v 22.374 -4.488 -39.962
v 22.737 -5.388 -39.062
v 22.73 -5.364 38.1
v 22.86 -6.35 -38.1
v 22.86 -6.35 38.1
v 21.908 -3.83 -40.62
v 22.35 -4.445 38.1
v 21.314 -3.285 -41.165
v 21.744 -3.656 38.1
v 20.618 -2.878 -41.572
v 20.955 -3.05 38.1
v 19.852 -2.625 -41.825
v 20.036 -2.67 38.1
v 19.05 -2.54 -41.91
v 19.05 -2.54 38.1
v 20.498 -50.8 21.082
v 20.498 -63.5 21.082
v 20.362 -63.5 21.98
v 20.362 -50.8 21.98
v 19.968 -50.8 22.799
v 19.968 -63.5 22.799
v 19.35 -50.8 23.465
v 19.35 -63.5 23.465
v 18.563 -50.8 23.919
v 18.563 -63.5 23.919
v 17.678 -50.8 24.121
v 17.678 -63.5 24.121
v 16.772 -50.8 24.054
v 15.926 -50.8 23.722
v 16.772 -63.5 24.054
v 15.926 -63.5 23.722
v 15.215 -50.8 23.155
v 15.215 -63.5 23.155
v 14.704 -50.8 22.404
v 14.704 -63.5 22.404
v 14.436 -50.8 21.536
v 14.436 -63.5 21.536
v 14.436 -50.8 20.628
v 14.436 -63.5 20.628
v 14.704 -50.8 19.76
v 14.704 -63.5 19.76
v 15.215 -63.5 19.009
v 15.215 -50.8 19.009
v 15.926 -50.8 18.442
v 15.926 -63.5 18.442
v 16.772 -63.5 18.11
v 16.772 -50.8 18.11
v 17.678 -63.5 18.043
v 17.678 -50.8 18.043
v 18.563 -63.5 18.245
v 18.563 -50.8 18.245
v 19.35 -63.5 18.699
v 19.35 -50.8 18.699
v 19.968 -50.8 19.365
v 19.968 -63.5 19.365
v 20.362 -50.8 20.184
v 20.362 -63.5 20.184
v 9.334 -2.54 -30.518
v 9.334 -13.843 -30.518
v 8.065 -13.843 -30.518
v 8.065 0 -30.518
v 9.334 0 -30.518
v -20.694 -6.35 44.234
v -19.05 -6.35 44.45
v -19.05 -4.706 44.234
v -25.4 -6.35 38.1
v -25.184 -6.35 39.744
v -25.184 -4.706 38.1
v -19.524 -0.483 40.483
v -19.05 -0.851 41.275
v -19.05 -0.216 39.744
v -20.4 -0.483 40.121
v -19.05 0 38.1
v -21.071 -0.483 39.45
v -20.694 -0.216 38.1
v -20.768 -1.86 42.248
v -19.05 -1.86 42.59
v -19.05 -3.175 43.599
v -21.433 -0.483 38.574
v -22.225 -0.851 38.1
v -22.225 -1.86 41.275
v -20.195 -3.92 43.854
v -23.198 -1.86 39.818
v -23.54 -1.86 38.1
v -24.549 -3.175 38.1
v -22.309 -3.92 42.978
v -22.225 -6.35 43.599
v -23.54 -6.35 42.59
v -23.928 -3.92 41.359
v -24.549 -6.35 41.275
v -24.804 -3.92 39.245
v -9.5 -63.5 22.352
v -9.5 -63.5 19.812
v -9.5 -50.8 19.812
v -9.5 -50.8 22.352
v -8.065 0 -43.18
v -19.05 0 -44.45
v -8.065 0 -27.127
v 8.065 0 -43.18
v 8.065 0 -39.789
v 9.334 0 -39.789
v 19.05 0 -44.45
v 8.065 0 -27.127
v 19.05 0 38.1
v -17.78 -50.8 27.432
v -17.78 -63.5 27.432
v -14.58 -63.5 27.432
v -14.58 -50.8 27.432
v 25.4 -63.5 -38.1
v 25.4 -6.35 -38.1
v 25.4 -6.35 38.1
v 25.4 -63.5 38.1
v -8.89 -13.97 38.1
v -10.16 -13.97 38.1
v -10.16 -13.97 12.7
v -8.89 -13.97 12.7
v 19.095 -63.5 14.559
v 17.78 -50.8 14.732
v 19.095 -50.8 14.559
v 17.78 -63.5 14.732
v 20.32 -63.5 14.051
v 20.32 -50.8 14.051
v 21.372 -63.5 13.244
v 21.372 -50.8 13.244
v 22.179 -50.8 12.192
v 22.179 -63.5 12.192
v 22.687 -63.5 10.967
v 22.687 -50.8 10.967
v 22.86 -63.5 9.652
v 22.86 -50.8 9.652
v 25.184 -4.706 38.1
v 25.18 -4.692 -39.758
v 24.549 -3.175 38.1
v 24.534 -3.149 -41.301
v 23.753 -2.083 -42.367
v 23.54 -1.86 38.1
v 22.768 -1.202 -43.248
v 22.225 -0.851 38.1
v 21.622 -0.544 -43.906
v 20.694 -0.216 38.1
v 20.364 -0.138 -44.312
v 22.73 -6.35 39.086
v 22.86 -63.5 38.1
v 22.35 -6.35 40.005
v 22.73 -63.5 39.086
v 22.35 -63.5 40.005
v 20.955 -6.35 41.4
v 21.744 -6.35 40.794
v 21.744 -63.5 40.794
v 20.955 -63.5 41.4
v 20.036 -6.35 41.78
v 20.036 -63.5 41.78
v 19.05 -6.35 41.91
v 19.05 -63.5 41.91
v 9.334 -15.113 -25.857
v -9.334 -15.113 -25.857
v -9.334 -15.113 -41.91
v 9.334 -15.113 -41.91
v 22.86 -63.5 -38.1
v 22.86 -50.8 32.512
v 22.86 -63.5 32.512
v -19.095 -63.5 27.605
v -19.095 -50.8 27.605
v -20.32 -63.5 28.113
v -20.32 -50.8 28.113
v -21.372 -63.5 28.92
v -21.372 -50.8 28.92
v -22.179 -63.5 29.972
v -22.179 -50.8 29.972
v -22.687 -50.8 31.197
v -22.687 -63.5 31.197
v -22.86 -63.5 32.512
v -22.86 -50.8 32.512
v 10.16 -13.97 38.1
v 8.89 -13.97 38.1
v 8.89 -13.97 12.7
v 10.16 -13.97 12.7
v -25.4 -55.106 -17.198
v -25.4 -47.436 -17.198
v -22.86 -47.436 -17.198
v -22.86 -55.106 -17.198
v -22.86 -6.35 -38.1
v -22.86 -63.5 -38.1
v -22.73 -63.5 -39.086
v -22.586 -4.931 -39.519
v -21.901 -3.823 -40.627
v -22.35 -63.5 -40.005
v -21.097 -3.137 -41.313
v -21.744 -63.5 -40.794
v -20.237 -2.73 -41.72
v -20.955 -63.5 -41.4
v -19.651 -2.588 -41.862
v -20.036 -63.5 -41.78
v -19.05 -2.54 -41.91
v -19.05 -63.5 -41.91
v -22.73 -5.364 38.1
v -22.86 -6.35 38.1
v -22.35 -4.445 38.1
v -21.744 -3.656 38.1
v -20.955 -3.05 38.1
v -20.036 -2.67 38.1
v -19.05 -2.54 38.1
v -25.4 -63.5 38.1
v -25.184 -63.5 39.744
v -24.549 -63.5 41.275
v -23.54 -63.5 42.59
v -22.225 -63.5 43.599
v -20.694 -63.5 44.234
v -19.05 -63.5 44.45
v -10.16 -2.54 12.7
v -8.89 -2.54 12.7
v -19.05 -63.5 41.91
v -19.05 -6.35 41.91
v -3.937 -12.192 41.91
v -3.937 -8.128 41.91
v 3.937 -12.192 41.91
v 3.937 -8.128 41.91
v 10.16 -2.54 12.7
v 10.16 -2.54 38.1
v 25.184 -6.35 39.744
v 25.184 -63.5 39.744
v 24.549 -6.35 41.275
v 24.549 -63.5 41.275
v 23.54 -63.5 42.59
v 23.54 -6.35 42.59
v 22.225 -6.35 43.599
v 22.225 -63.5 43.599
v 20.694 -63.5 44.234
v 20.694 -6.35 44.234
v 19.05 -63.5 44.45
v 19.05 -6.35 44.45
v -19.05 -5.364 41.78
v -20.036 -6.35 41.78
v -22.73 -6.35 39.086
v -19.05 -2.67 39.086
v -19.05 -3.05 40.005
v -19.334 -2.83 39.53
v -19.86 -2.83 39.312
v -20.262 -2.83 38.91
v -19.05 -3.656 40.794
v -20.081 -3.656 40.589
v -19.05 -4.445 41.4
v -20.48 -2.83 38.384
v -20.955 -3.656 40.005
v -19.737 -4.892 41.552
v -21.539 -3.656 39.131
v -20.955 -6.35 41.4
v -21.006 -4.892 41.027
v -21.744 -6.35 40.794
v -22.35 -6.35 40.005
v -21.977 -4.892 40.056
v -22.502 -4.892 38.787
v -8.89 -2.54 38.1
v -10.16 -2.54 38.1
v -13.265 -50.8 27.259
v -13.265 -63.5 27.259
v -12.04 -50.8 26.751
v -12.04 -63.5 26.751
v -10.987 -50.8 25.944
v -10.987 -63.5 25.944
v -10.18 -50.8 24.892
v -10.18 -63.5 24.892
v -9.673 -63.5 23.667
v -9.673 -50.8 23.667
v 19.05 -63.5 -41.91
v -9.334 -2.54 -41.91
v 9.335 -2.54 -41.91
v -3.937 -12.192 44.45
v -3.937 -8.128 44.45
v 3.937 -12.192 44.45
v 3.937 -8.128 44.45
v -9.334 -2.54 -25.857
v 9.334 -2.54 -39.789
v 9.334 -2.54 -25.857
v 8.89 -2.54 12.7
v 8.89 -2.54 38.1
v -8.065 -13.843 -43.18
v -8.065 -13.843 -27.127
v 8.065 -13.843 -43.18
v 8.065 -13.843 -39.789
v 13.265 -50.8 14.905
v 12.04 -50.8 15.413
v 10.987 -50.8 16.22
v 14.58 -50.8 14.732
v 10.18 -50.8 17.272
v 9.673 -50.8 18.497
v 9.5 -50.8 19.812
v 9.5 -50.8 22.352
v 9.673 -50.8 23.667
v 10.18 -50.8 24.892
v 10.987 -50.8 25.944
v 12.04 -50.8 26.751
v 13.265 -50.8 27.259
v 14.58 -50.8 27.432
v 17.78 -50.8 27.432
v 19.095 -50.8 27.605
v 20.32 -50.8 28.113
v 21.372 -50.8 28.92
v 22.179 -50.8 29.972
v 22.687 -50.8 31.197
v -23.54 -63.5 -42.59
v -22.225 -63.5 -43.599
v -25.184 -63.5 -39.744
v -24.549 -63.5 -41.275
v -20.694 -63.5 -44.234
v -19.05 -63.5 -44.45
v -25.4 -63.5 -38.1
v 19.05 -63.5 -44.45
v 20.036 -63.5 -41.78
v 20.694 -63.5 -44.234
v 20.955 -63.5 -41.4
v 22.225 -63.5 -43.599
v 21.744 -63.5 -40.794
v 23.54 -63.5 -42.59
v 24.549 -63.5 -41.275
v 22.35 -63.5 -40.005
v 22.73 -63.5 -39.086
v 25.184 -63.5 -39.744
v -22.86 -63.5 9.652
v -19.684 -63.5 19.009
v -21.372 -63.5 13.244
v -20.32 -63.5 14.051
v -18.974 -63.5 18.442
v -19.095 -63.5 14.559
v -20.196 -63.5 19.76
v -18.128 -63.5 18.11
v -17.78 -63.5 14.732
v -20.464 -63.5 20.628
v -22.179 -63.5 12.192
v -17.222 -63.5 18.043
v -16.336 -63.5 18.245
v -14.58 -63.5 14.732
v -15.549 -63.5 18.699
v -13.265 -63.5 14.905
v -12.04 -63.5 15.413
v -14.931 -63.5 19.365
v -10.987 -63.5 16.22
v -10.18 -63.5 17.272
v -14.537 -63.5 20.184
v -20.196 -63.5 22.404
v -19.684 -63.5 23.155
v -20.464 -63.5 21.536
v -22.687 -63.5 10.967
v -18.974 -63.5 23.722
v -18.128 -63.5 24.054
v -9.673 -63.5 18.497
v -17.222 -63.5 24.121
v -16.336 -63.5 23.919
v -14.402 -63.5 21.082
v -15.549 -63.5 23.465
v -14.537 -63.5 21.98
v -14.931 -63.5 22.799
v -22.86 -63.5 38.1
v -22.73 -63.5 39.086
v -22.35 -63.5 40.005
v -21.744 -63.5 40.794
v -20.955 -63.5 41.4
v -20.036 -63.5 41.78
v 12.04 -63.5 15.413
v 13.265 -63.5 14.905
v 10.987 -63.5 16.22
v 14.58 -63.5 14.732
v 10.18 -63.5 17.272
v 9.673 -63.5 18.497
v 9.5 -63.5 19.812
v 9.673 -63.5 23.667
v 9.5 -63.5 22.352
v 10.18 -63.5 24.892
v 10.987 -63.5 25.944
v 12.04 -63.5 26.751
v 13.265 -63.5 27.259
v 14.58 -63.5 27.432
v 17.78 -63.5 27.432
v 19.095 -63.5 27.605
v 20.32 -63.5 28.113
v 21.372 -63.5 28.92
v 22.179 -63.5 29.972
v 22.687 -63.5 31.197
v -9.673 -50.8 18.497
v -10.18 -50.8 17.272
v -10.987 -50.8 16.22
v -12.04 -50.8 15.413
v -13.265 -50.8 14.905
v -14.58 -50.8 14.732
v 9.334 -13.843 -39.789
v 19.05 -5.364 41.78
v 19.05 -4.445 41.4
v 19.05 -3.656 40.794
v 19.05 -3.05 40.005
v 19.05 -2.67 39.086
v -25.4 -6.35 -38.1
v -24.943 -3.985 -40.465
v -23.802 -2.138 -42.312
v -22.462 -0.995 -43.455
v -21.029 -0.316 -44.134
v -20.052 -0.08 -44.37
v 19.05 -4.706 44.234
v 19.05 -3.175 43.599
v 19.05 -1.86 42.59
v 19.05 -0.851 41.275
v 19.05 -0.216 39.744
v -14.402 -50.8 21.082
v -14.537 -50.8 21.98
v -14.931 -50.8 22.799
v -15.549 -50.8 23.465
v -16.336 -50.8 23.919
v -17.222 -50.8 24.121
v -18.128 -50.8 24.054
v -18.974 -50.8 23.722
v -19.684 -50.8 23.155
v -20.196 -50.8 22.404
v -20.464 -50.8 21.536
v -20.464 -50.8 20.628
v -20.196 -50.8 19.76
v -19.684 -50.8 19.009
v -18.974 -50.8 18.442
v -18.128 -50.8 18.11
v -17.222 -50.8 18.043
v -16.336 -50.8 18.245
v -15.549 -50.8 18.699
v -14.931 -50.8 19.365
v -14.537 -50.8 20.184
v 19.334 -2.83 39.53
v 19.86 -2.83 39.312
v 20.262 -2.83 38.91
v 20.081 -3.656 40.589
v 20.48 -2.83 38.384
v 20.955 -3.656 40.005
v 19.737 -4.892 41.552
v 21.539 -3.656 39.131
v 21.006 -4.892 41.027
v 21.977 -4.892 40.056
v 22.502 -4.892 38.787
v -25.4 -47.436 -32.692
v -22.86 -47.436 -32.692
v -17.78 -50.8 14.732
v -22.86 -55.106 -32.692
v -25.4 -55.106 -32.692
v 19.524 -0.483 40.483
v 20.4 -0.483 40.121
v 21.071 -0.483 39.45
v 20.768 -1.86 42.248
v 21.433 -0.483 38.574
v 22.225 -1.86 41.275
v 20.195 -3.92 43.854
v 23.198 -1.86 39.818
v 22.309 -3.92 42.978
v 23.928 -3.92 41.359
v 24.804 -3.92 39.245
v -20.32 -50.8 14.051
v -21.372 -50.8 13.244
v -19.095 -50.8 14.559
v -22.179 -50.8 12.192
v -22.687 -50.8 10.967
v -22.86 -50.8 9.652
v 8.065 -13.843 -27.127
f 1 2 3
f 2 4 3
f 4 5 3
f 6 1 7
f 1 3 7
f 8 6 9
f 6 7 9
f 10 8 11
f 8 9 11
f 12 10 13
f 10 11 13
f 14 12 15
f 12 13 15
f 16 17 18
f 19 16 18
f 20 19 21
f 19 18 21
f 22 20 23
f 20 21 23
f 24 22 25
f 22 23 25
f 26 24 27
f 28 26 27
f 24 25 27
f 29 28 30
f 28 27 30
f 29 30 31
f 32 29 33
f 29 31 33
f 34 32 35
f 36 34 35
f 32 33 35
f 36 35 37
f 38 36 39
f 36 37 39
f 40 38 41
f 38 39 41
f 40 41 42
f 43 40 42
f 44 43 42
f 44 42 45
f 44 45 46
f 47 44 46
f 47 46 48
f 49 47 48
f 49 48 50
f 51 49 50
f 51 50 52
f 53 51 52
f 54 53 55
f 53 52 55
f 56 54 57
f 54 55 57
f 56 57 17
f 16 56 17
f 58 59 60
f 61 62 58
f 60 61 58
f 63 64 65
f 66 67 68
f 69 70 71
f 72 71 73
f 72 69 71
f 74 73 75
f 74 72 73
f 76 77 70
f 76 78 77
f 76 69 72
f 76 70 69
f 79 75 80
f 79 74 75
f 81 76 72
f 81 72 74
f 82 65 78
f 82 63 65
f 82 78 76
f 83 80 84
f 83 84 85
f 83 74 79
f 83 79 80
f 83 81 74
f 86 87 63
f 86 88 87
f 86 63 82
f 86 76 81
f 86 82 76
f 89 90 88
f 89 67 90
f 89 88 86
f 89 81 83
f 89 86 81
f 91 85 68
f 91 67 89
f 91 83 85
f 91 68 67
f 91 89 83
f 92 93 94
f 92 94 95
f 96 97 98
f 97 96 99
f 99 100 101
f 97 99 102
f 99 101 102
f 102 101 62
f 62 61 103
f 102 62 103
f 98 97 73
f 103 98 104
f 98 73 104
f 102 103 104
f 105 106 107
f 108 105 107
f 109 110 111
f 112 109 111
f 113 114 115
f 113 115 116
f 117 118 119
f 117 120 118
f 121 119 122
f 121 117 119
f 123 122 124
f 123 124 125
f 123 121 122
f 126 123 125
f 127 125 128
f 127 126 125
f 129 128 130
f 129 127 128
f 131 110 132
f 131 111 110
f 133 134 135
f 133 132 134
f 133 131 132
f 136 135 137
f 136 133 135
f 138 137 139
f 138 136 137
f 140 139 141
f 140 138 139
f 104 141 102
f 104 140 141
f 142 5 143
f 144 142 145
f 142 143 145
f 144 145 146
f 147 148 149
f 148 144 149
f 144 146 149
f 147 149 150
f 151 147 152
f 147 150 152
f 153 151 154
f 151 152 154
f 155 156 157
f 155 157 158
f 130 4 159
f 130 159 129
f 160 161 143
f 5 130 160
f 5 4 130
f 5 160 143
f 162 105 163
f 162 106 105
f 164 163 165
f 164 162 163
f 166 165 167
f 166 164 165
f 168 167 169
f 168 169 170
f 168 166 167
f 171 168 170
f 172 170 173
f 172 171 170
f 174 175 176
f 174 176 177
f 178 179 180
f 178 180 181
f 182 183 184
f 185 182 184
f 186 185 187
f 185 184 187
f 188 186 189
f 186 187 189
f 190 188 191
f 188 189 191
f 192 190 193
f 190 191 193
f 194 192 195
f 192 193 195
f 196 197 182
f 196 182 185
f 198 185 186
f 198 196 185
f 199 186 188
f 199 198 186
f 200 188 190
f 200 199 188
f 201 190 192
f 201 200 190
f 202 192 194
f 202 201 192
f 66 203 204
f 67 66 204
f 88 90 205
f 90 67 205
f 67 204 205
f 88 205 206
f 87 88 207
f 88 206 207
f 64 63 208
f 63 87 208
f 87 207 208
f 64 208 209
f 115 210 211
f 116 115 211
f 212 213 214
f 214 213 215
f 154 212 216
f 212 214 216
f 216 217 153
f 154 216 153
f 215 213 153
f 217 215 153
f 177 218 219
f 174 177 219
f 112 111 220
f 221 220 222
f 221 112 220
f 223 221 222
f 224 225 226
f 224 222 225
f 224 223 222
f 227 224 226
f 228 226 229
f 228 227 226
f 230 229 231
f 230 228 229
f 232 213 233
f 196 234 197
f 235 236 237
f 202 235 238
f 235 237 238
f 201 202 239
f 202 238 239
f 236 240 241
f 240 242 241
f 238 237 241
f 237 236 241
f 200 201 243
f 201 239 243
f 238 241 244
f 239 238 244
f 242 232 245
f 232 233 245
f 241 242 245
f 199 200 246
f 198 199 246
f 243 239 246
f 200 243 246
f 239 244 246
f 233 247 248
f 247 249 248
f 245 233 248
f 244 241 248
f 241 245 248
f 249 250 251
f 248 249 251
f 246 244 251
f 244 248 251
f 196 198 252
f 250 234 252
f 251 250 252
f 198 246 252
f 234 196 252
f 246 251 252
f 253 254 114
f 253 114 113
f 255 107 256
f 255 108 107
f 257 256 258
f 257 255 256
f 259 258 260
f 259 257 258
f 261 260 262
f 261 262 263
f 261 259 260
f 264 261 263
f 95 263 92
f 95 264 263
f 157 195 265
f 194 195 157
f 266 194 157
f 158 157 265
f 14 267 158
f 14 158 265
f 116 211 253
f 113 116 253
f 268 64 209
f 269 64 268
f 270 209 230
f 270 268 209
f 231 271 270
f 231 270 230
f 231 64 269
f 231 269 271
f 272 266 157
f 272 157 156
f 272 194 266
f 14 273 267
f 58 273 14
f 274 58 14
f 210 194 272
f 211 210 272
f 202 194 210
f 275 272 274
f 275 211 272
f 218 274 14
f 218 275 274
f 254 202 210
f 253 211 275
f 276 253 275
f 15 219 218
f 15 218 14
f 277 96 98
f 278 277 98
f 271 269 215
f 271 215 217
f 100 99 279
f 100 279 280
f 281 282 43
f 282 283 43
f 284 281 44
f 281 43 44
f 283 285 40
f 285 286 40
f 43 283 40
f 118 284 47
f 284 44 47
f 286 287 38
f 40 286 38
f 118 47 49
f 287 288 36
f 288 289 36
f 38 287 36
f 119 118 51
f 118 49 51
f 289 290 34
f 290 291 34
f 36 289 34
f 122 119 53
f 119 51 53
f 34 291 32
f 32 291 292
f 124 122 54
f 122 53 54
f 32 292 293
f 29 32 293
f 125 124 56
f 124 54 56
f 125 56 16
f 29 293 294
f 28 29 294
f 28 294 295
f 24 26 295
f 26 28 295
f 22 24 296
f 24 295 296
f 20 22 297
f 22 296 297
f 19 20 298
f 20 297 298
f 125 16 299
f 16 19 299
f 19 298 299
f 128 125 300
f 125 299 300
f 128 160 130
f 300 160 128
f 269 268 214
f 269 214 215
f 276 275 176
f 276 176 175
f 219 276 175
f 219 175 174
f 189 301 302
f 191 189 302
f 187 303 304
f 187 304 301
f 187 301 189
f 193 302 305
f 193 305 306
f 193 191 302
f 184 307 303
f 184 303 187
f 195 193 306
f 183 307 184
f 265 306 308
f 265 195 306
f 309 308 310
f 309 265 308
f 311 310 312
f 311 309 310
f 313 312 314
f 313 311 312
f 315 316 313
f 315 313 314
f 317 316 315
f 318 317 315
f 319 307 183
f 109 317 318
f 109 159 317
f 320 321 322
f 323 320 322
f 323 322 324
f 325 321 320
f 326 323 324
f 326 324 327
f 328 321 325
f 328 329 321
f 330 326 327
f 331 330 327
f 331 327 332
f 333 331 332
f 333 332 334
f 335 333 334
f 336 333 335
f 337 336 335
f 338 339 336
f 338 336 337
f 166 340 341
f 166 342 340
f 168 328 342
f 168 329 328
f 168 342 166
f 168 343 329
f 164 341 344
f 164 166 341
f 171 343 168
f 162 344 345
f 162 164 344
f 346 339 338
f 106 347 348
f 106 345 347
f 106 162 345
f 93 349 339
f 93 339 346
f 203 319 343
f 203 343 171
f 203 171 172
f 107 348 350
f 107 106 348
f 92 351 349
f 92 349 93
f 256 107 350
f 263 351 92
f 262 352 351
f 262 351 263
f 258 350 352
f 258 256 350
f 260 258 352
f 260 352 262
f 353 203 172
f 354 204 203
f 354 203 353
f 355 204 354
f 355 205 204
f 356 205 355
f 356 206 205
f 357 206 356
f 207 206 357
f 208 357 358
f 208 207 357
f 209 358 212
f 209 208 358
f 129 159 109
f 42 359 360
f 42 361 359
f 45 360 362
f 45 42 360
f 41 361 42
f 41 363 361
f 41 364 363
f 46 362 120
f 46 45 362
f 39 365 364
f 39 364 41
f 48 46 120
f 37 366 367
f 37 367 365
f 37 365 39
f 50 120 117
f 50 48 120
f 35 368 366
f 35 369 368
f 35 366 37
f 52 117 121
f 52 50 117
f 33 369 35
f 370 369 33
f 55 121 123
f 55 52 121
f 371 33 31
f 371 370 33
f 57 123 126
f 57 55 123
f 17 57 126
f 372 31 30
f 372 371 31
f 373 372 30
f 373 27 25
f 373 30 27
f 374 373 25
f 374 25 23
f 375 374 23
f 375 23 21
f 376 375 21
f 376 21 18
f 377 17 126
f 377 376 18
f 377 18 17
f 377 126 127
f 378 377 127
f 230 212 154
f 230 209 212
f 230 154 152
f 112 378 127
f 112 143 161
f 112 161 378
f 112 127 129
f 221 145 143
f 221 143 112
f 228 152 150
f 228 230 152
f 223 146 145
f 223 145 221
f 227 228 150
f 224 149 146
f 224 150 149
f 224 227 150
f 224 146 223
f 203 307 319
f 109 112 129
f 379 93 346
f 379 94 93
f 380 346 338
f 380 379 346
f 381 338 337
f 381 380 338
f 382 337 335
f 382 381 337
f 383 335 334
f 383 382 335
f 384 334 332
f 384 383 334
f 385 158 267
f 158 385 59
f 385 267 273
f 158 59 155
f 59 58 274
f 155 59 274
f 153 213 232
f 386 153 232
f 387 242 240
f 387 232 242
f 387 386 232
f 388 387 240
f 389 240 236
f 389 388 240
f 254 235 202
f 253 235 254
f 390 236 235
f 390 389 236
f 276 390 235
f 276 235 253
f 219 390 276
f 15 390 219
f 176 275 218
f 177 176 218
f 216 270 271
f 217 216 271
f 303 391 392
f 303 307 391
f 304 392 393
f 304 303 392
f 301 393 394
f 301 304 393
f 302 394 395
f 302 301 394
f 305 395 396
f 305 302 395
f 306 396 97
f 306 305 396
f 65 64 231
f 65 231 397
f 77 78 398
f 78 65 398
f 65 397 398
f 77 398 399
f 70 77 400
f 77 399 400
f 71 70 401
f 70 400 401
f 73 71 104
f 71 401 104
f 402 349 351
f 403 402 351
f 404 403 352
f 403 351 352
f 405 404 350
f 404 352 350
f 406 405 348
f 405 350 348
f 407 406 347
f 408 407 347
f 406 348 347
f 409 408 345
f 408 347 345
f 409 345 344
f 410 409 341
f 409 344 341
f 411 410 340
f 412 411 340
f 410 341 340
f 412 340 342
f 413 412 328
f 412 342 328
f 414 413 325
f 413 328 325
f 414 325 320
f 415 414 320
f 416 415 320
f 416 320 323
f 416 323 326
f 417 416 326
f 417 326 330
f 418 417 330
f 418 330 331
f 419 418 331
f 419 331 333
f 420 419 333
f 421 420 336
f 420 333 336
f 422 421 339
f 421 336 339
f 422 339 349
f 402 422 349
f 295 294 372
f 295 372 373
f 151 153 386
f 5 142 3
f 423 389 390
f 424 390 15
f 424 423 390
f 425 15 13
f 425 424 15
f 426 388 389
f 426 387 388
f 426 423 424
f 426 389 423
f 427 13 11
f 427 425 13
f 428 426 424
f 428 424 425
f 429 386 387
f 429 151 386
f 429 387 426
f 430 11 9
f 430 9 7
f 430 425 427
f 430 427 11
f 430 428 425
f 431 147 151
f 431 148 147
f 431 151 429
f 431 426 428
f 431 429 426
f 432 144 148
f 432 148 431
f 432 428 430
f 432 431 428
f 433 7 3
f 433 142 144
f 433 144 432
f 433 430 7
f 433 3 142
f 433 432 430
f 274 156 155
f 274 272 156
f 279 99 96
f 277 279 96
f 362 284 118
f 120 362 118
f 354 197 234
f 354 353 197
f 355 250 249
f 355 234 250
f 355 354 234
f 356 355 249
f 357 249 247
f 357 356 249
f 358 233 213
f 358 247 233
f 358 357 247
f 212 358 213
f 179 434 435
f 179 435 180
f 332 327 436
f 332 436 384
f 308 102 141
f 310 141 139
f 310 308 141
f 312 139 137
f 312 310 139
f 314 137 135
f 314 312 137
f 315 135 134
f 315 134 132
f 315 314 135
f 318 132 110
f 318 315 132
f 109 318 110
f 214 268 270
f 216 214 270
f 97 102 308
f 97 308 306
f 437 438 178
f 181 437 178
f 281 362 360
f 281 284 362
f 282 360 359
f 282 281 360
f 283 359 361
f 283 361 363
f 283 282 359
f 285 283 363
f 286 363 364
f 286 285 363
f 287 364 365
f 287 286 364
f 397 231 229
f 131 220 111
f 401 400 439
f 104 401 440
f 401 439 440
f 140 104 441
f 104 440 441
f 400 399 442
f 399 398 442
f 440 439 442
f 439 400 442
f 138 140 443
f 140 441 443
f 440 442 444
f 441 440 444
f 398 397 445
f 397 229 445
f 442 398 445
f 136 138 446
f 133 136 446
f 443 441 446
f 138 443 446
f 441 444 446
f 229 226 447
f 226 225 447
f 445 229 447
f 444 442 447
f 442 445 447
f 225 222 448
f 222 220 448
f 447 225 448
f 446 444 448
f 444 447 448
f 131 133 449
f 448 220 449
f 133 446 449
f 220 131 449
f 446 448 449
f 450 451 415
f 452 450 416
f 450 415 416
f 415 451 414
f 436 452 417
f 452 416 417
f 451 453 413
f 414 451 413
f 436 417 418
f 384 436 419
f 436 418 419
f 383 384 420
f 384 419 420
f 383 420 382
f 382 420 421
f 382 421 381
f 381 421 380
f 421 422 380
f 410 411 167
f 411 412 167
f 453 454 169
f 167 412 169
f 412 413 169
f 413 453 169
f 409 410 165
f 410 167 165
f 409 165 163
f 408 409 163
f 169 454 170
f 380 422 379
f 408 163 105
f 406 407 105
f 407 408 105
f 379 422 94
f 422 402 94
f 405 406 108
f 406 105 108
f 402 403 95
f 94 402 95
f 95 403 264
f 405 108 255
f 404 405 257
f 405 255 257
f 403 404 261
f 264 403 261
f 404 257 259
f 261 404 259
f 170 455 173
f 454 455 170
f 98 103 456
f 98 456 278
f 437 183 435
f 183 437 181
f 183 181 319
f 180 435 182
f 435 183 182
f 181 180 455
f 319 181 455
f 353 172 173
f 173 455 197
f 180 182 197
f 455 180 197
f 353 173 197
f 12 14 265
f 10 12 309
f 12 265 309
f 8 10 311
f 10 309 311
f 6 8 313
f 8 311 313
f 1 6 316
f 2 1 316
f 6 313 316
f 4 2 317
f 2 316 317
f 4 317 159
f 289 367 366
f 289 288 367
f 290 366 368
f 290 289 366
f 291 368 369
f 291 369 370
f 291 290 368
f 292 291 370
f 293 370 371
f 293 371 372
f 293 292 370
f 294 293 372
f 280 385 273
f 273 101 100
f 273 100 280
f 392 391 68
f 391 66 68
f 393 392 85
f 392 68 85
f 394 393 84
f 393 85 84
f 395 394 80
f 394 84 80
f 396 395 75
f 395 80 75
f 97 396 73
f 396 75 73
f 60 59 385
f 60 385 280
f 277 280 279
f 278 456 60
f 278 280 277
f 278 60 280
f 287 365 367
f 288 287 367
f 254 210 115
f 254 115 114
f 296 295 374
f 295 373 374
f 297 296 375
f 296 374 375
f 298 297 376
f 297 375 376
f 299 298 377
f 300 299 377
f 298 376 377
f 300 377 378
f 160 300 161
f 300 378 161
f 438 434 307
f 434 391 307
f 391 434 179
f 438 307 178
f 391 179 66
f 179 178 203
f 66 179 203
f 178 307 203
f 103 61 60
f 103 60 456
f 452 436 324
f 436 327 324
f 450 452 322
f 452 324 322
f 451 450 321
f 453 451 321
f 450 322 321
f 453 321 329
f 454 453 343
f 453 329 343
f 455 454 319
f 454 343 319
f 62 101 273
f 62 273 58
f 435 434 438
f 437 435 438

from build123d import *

# Parameters (mm, degrees)
F0_W      = 50.8
F0_H      = 88.9
F1_DEPTH  = 63.5
F2_R      = 6.35
F3_T      = -2.54
F4_W      = 15.9004
F4_H      = 12.7
F4_R      = 3.048
F5_DEPTH  = 12.7
F6_R      = 5.08
F7_W      = 7.874
F7_H      = 4.064
F8_DEPTH  = 25.4
F9_W      = 1.27
F9_H      = 25.4
F10_DEPTH = 11.43
F11_W     = 16.129
F11_H     = 16.0528
F12_DEPTH = 13.843
F11_W_2   = 18.669
F11_H_2   = 18.5928
F13_DEPTH = 13.843
F14_W     = 3.7612880599
F14_H     = 9.271
F15_DEPTH = 13.843
F16_W     = 18.669
F16_H     = 18.5928
F17_DEPTH = 1.27
F18_W     = 7.6708
F18_H     = 15.494
F19_DEPTH = 25.4


with BuildPart() as f1:
    # F0 (on Front) → F1 (new body)
    with BuildSketch(Plane.XZ):
        Rectangle(F0_W, F0_H)
    extrude(amount=F1_DEPTH)

    # F2
    f2_edges = [f1.edges().sort_by_distance(p)[0] for p in [
        (25.4, -31.75, 44.45),
        (-25.4, -31.75, 44.45),
        (0, 0, 44.45),
        (25.4, -31.75, -44.45),
        (-25.4, -31.75, -44.45),
        (25.4, 0, 0),
        (-25.4, 0, 0),
    ]]
    fillet(f2_edges, radius=F2_R)

    # F3
    f3_openings = [f1.faces().sort_by_distance(p)[0] for p in [
        (0, -63.5, 0),
    ]]
    offset(amount=F3_T, openings=f3_openings)

    # F4 (on face) → F5 (join)
    with BuildSketch(Plane.XZ.offset(63.5)):
        with Locations((-17.4498, 21.082)):
            Rectangle(F4_W, F4_H)
        with Locations((-17.4498, 21.082)):
            Circle(F4_R, mode=Mode.SUBTRACT)
        with Locations((17.4498, 21.082)):
            Rectangle(F4_W, F4_H)
        with Locations((17.4498, 21.082)):
            Circle(F4_R, mode=Mode.SUBTRACT)
    extrude(amount=-F5_DEPTH)

    # F6
    f6_edges = [f1.edges().sort_by_distance(p)[0] for p in [
        (-9.4996, -57.15, 27.432),
        (-9.4996, -57.15, 14.732),
        (9.4996, -57.15, 14.732),
        (9.4996, -57.15, 27.432),
        (-22.86, -57.15, 27.432),
        (22.86, -57.15, 27.432),
        (-22.86, -57.15, 14.732),
        (22.86, -57.15, 14.732),
    ]]
    fillet(f6_edges, radius=F6_R)

    # F7 (on face) → F8 (cut)
    with BuildSketch(Plane.XY.offset(44.45)):
        with Locations((0, -10.16)):
            Rectangle(F7_W, F7_H)
    extrude(amount=-F8_DEPTH, mode=Mode.SUBTRACT)

    # F9 (on face) → F10 (join)
    with BuildSketch(Plane.XZ.offset(2.54)):
        with Locations((-9.525, 25.4)):
            Rectangle(F9_W, F9_H)
        with Locations((9.525, 25.4)):
            Rectangle(F9_W, F9_H)
    extrude(amount=F10_DEPTH)

    # F11 (on face) → F12 (cut)
    with BuildSketch(Plane(origin=(0, 0, 0), x_dir=(-1, 0, 0), z_dir=(0, 1, 0))):
        with Locations((0, -35.1536)):
            Rectangle(F11_W, F11_H)
    extrude(amount=-F12_DEPTH, mode=Mode.SUBTRACT)

    # F11 (on face) → F13 (join)
    with BuildSketch(Plane(origin=(0, 0, 0), x_dir=(-1, 0, 0), z_dir=(0, 1, 0))):
        with Locations((0, -35.1536)):
            Rectangle(F11_W_2, F11_H_2)
        with Locations((0, -35.1536)):
            Rectangle(F11_W, F11_H, mode=Mode.SUBTRACT)
    extrude(amount=-F13_DEPTH)

    # F14 (on face) → F15 (cut)
    with BuildSketch(Plane(origin=(0, 0, 0), x_dir=(-1, 0, 0), z_dir=(0, 1, 0))):
        with Locations((-7.45385597, -35.1536)):
            Rectangle(F14_W, F14_H)
    extrude(amount=-F15_DEPTH, mode=Mode.SUBTRACT)

    # F16 (on face) → F17 (join)
    with BuildSketch(Plane.XZ.offset(13.843)):
        with Locations((0, -35.1536)):
            Rectangle(F16_W, F16_H)
    extrude(amount=F17_DEPTH)

    # F18 (on face) → F19 (cut)
    with BuildSketch(Plane(origin=(-25.4, 0, 0), x_dir=(0, -1, 0), z_dir=(-1, 0, 0))):
        with Locations((51.2709531141, -24.9448278919)):
            Rectangle(F18_W, F18_H)
    extrude(amount=-F19_DEPTH, mode=Mode.SUBTRACT)


solid = f1.part
